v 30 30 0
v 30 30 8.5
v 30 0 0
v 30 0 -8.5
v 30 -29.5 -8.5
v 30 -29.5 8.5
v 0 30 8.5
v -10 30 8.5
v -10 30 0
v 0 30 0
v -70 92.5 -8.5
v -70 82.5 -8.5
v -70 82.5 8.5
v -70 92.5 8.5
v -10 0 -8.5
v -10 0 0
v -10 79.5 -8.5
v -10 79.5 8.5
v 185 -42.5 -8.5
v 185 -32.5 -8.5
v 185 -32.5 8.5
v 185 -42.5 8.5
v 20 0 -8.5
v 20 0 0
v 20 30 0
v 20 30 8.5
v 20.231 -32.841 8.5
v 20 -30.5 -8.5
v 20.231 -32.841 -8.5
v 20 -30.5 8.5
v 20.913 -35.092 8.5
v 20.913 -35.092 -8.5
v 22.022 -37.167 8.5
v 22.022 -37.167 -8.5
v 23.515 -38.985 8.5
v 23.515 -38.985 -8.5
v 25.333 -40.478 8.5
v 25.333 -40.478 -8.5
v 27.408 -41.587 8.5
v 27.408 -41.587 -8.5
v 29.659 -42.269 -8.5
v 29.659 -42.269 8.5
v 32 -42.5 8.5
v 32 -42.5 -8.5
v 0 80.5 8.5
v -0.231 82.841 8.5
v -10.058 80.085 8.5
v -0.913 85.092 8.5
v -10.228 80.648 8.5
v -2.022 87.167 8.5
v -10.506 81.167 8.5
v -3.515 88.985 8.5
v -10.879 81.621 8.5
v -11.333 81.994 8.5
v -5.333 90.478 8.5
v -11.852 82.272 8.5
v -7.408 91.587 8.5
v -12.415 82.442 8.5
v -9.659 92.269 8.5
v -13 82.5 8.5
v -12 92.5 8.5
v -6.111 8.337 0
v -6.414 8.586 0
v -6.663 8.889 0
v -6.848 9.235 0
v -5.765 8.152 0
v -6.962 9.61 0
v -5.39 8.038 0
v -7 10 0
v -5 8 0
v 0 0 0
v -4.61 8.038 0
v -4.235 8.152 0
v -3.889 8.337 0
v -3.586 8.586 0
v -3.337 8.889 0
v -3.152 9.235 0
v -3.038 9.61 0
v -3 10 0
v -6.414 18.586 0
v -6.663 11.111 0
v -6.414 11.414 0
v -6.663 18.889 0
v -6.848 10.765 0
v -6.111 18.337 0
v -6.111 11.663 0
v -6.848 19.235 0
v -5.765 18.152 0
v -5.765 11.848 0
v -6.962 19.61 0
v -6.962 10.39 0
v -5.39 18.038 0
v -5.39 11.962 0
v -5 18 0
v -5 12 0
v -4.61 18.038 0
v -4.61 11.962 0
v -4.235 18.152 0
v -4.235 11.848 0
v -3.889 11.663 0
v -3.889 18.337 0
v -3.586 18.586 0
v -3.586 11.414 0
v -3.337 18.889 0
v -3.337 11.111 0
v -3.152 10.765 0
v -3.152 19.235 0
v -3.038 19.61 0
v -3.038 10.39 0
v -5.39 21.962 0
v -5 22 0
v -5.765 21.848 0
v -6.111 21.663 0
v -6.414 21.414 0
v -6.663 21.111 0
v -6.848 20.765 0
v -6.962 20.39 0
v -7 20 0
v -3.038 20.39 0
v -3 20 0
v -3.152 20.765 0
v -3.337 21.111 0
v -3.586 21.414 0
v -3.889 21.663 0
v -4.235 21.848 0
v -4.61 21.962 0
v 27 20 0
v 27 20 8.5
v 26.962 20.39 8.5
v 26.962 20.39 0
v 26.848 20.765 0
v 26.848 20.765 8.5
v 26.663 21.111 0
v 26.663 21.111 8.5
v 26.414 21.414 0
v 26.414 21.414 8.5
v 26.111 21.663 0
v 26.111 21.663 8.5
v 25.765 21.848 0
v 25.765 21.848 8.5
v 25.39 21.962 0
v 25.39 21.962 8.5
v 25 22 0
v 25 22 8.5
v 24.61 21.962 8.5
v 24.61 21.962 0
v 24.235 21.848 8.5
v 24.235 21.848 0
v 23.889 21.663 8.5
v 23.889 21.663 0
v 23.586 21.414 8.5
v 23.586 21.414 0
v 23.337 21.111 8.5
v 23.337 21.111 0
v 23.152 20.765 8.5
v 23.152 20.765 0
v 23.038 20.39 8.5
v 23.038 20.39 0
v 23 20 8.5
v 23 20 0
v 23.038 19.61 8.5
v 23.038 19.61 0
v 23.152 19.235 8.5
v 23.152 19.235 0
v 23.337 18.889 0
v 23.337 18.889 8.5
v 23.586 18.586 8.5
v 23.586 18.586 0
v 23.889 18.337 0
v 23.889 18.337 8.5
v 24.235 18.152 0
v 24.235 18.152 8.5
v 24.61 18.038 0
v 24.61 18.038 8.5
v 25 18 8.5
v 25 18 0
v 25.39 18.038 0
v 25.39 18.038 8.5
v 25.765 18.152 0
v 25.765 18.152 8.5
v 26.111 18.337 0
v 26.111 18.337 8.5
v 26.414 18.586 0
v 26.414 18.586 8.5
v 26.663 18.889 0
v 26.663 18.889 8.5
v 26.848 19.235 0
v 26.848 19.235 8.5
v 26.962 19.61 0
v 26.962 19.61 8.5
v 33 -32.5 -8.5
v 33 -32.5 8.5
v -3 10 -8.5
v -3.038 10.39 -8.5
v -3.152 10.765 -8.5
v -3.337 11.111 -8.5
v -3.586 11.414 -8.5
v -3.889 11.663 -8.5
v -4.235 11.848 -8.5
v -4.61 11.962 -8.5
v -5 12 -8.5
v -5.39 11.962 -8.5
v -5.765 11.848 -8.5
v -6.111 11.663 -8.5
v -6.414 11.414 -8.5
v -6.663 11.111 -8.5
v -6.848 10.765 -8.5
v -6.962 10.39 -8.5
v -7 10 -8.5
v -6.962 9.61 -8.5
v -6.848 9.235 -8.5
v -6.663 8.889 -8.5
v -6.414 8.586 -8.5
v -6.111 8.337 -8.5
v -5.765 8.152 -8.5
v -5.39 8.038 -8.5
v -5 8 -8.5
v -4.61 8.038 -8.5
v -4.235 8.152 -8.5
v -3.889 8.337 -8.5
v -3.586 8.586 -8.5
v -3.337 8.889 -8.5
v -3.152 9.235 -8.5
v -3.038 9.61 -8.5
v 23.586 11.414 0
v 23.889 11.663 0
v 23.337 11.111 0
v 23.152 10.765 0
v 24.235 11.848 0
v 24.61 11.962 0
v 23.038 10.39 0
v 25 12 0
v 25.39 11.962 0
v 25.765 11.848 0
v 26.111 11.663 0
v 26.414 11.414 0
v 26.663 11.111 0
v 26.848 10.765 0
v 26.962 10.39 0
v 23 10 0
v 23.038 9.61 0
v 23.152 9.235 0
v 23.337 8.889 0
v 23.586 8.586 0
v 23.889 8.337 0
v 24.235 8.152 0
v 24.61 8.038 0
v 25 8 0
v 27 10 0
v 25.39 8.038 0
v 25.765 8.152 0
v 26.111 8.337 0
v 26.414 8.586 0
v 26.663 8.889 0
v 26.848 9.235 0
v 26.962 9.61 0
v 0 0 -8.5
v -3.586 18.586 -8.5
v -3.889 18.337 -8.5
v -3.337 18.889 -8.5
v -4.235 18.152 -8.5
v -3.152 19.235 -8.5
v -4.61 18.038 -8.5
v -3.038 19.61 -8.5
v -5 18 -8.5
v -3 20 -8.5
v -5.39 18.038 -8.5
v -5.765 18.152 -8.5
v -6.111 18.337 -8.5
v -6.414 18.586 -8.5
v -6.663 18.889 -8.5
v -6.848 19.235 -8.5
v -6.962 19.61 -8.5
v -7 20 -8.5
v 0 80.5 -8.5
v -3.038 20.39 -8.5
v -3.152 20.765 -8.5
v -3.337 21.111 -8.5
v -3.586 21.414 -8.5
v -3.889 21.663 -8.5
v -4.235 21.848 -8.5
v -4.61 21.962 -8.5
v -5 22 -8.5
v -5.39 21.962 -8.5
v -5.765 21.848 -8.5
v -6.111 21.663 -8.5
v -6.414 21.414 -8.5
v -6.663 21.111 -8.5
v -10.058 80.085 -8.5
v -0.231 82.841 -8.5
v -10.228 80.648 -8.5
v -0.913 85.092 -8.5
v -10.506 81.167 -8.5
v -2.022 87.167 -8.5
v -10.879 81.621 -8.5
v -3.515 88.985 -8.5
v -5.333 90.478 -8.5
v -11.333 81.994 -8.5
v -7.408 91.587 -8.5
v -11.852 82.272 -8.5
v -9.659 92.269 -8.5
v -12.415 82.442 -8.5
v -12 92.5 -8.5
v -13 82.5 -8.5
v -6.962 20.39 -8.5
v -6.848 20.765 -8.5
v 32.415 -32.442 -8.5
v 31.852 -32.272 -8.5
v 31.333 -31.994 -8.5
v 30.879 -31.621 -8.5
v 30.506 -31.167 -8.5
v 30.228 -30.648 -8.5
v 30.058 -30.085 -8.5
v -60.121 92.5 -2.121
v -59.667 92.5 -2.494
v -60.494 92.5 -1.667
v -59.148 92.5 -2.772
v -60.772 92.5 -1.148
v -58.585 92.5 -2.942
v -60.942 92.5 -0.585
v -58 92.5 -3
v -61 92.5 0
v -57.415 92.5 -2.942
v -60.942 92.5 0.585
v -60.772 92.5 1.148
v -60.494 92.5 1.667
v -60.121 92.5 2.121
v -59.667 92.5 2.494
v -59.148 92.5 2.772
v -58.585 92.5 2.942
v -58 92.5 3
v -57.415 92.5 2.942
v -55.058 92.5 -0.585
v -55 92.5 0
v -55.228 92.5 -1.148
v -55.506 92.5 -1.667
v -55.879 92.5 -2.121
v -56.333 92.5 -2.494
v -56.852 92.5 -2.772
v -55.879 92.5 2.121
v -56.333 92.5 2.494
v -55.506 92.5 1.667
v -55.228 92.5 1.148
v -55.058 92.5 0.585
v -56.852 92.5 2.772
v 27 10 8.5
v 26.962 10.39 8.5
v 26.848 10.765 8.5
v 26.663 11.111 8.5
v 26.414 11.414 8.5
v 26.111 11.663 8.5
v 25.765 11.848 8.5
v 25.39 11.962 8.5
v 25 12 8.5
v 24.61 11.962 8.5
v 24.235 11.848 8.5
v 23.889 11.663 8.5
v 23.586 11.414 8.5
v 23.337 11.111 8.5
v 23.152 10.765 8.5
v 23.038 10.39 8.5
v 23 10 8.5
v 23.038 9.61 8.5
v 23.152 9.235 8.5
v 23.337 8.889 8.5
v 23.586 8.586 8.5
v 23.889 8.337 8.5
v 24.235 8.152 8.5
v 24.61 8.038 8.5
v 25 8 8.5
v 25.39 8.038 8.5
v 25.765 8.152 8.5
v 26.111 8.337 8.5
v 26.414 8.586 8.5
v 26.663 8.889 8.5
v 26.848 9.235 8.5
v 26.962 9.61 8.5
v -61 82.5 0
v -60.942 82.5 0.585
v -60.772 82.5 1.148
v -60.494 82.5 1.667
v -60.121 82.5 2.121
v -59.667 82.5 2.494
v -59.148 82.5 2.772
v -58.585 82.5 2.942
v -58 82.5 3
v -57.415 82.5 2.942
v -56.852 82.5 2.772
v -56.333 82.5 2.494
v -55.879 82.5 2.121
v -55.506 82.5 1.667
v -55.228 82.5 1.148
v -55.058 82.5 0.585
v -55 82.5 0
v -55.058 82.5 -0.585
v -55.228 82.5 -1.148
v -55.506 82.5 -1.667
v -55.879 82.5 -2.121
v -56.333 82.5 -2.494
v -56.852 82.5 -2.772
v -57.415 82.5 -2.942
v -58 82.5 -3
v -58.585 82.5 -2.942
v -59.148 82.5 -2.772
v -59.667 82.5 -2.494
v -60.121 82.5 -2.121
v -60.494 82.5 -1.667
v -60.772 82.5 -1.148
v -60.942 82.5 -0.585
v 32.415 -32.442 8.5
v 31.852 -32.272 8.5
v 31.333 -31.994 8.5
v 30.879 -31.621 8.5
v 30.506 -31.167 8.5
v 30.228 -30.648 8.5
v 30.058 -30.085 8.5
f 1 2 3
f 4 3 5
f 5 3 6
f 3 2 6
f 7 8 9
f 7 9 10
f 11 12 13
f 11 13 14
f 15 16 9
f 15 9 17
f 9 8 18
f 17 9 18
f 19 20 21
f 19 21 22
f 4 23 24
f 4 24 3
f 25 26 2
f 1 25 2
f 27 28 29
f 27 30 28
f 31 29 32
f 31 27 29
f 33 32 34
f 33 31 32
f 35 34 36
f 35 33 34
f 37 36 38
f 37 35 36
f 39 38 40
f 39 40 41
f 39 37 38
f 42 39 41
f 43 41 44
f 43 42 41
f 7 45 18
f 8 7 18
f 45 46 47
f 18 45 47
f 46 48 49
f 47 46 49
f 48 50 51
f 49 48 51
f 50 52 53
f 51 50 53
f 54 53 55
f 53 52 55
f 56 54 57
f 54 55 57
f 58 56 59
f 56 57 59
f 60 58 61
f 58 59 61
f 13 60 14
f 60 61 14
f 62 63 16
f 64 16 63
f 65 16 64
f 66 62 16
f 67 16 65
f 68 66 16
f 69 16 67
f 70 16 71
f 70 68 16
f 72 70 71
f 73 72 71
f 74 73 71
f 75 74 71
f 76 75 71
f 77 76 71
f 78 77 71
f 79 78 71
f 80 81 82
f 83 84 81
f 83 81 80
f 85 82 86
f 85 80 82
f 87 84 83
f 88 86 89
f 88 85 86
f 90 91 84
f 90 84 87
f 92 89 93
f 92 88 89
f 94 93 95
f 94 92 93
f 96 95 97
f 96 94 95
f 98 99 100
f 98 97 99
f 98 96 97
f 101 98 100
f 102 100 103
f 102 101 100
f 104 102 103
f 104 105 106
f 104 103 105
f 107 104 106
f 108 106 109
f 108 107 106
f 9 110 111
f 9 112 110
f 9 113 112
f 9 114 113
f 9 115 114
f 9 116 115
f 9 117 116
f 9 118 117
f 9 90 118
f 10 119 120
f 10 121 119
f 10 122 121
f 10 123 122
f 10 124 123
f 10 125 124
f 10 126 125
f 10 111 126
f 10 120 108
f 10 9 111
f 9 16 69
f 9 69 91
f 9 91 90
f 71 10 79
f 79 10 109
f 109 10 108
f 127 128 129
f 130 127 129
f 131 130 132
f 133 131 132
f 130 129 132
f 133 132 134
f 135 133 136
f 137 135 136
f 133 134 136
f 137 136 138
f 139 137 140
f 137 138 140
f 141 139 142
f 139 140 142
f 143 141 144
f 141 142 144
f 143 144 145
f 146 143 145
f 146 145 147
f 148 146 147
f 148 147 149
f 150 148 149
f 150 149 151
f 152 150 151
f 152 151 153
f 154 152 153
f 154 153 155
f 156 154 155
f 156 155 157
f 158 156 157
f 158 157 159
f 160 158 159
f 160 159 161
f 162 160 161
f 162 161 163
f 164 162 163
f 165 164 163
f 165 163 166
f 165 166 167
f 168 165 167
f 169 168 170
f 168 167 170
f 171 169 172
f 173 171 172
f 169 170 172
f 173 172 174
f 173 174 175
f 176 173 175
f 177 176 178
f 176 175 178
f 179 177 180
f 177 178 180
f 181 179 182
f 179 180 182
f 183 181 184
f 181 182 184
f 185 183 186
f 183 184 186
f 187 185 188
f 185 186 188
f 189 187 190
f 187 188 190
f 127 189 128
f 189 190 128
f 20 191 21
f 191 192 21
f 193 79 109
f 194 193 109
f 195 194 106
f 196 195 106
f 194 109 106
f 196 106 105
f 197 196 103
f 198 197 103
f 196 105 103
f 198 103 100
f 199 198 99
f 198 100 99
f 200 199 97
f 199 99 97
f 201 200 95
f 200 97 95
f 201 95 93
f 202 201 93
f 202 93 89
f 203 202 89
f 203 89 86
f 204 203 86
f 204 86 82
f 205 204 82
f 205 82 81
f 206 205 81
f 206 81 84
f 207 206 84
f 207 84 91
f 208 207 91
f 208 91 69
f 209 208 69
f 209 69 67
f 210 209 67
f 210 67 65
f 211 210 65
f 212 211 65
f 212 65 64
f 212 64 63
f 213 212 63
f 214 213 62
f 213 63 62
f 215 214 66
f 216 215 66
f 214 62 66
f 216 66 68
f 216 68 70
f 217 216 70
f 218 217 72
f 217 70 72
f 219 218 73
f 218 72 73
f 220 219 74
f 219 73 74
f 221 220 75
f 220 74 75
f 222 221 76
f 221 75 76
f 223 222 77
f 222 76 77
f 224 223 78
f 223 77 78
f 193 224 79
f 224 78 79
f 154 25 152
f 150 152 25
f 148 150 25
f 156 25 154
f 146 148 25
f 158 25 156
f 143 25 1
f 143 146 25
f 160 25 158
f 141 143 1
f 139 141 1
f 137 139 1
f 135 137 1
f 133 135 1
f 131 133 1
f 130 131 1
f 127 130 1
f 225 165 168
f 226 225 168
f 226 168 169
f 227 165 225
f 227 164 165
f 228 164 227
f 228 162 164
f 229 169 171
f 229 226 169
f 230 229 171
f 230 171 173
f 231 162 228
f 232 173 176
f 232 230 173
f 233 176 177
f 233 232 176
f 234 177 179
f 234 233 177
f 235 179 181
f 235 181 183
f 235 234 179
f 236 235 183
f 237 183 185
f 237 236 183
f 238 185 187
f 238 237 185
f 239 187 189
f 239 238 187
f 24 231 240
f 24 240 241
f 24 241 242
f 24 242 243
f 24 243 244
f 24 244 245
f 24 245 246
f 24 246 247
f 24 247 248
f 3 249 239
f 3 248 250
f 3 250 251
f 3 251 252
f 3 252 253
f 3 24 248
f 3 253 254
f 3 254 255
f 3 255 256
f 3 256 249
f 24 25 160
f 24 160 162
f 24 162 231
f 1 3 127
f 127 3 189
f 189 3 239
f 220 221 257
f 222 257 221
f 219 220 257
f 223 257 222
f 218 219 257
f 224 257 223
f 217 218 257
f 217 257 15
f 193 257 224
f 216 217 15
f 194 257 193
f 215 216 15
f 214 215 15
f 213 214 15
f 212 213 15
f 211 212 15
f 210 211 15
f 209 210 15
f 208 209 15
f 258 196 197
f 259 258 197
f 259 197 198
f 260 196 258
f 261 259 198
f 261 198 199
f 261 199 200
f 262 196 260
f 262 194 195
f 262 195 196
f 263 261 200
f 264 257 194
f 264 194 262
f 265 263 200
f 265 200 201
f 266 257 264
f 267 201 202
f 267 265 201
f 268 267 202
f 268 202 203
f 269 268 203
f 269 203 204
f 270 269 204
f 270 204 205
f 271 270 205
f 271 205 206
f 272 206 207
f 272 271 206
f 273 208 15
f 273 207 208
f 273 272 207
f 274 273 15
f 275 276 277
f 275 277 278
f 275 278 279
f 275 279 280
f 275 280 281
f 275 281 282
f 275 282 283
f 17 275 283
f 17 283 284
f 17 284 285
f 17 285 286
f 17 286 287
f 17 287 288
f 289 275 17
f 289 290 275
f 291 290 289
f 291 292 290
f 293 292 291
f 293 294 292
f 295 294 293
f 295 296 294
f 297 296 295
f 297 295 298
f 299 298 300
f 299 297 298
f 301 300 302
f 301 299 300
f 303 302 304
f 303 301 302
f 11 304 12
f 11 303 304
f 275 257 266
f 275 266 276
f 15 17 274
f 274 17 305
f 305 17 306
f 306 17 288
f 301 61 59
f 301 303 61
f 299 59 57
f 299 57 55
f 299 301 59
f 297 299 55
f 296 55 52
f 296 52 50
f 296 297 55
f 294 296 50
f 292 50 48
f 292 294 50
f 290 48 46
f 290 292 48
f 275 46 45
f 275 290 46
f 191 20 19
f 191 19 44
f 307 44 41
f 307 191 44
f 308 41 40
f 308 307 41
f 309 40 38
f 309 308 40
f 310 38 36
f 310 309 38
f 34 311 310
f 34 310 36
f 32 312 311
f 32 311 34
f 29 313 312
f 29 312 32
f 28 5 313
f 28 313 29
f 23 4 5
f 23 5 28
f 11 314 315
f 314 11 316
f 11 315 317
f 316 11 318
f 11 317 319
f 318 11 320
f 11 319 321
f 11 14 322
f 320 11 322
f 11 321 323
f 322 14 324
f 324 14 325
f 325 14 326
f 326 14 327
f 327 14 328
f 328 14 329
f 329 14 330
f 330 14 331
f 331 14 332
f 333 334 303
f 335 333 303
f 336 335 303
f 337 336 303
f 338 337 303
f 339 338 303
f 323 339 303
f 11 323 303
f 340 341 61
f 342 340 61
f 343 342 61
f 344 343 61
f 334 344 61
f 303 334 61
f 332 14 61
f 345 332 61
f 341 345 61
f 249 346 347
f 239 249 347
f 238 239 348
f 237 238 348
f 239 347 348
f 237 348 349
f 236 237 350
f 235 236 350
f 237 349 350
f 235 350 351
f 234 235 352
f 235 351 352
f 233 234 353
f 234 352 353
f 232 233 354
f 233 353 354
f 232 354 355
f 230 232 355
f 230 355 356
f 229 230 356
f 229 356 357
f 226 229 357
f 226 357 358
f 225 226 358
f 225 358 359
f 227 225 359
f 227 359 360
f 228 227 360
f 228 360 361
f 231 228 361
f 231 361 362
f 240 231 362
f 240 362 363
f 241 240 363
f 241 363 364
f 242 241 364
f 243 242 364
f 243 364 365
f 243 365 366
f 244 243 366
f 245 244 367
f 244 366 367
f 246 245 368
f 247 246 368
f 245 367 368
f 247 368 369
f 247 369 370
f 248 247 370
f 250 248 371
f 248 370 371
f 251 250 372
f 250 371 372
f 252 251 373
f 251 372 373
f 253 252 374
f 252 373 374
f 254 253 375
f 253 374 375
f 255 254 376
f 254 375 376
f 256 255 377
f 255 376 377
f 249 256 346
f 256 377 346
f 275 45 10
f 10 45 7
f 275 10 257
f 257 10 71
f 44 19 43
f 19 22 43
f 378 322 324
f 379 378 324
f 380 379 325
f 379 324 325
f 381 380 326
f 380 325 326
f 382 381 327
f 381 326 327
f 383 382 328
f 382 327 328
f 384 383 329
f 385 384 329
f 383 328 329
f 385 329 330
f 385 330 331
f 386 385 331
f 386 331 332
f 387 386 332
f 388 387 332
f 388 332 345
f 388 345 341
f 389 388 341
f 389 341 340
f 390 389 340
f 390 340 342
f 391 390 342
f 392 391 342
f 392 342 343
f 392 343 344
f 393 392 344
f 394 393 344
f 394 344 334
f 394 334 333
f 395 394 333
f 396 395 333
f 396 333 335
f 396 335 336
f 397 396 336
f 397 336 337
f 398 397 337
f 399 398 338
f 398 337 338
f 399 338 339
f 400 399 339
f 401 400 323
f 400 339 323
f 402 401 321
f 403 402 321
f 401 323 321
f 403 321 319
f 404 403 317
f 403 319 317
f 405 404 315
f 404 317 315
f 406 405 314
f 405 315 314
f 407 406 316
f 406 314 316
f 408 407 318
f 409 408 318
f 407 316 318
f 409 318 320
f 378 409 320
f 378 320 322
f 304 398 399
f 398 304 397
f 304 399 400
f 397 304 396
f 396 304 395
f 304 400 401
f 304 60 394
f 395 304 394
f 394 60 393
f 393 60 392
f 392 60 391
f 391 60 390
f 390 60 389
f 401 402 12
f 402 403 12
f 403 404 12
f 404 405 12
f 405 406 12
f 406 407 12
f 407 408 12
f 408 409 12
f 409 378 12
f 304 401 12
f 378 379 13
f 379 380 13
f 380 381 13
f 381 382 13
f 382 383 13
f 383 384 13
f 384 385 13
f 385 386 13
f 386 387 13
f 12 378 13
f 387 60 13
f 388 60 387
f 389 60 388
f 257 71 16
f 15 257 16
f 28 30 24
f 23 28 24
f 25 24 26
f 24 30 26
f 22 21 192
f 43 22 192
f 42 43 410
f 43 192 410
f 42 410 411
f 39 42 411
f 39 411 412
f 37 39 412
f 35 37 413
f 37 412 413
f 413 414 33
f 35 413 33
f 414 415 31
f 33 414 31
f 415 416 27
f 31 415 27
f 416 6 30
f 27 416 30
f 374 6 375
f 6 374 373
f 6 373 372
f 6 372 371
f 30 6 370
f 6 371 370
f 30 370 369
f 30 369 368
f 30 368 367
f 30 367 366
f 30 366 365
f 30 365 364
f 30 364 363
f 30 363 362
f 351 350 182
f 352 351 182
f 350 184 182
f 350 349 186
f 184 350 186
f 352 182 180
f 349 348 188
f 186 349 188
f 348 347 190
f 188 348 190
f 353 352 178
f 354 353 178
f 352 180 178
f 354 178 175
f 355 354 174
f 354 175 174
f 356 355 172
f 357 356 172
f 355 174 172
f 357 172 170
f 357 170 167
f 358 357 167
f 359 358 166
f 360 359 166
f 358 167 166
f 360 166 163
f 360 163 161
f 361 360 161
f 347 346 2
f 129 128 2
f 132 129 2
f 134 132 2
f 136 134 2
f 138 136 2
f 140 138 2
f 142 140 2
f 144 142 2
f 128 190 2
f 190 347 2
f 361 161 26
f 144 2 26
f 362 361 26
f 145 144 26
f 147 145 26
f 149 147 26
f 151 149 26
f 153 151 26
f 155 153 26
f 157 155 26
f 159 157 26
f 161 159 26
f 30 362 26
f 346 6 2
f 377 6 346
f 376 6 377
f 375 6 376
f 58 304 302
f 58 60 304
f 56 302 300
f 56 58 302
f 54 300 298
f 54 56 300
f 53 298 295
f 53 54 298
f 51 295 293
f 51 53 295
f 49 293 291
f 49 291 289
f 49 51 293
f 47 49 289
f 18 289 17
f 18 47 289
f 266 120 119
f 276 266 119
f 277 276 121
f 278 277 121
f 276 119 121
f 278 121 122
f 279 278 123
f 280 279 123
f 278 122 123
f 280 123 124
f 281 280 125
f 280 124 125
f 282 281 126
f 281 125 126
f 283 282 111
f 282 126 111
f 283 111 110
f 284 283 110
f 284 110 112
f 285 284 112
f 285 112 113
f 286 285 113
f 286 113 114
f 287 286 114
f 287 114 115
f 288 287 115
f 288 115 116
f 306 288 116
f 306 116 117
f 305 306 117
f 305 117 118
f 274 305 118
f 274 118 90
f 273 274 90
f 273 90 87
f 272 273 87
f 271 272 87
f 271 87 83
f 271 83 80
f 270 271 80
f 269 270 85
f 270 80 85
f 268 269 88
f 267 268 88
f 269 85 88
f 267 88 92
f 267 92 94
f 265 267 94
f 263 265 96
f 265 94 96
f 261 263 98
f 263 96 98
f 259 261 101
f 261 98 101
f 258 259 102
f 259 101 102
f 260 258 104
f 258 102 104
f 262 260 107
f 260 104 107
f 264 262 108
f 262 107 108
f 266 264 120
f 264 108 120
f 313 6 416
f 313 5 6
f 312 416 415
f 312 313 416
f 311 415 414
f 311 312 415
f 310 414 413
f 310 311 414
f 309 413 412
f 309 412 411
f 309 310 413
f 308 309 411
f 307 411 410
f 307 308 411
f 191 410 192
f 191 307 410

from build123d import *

# Parameters (mm, degrees)
PAD_DEPTH       = 8.5
SKETCH002_W     = 34.899784
SKETCH002_H     = 30
POCKET_DEPTH    = 8.5
SKETCH005_R     = 2
POCKET003_DEPTH = 8.501
SKETCH006_R     = 3
POCKET004_DEPTH = 92.501
FILLET001_R     = 12
FILLET002_R     = 3
PAD001_DEPTH    = 8.5
SKETCH003_W     = 35.43439
SKETCH003_H     = 30
POCKET001_DEPTH = 8.5
SKETCH004_R     = 2
POCKET002_DEPTH = 17.001
FILLET_R        = 12
FILLET003_R     = 3


with BuildPart() as base_corta:
    # Sketch → Pad (new body, symmetric)
    with BuildSketch(Plane.XY):
        Polygon((-70, 92.5), (0, 92.5), (0, 0), (-10, 0), (-10, 82.5), (-70, 82.5), align=None)
    extrude(amount=PAD_DEPTH, both=True)

    # Sketch002 → Pocket (cut)
    with BuildSketch(Plane.XY.offset(8.5)):
        with Locations((-6.620676, 15)):
            Rectangle(SKETCH002_W, SKETCH002_H)
    extrude(amount=-POCKET_DEPTH, mode=Mode.SUBTRACT)

    # Sketch005 → Pocket003 (cut, through all)
    with BuildSketch(Plane.XY):
        with Locations((-5, 10)):
            Circle(SKETCH005_R)
        with Locations((-5, 20)):
            Circle(SKETCH005_R)
    extrude(amount=-POCKET003_DEPTH, mode=Mode.SUBTRACT)

    # Sketch006 → Pocket004 (cut, through all)
    with BuildSketch(Plane(origin=(0, 92.5, 0), x_dir=(-1, 0, 0), z_dir=(0, 1, 0))):
        with Locations((58, 0)):
            Circle(SKETCH006_R)
    extrude(amount=-POCKET004_DEPTH, mode=Mode.SUBTRACT)

    # Fillet001
    fillet001_edges = [base_corta.edges().sort_by_distance(p)[0] for p in [
        (0, 92.5, 0),
    ]]
    fillet(fillet001_edges, radius=FILLET001_R)

    # Fillet002
    fillet002_edges = [base_corta.edges().sort_by_distance(p)[0] for p in [
        (-10, 82.5, 0),
    ]]
    fillet(fillet002_edges, radius=FILLET002_R)


with BuildPart() as base_larga:
    # Sketch001 → Pad001 (new body, symmetric)
    with BuildSketch(Plane.XY):
        Polygon((30, 30), (30, -32.5), (185, -32.5), (185, -42.5), (20, -42.5), (20, 30), align=None)
    extrude(amount=PAD001_DEPTH, both=True)

    # Sketch003 → Pocket001 (cut)
    with BuildSketch(Plane(origin=(0, 0, -8.5), x_dir=(1, 0, 0), z_dir=(0, 0, -1))):
        with Locations((32.063894, -15)):
            Rectangle(SKETCH003_W, SKETCH003_H)
    extrude(amount=-POCKET001_DEPTH, mode=Mode.SUBTRACT)

    # Sketch004 → Pocket002 (cut, through all)
    with BuildSketch(Plane.XY.offset(8.5)):
        with Locations((25, 20)):
            Circle(SKETCH004_R)
        with Locations((25, 10)):
            Circle(SKETCH004_R)
    extrude(amount=-POCKET002_DEPTH, mode=Mode.SUBTRACT)

    # Fillet
    fillet_edges = [base_larga.edges().sort_by_distance(p)[0] for p in [
        (20, -42.5, 0),
    ]]
    fillet(fillet_edges, radius=FILLET_R)

    # Fillet003
    fillet003_edges = [base_larga.edges().sort_by_distance(p)[0] for p in [
        (30, -32.5, 0),
    ]]
    fillet(fillet003_edges, radius=FILLET003_R)


solid = Compound([base_corta.part, base_larga.part])
